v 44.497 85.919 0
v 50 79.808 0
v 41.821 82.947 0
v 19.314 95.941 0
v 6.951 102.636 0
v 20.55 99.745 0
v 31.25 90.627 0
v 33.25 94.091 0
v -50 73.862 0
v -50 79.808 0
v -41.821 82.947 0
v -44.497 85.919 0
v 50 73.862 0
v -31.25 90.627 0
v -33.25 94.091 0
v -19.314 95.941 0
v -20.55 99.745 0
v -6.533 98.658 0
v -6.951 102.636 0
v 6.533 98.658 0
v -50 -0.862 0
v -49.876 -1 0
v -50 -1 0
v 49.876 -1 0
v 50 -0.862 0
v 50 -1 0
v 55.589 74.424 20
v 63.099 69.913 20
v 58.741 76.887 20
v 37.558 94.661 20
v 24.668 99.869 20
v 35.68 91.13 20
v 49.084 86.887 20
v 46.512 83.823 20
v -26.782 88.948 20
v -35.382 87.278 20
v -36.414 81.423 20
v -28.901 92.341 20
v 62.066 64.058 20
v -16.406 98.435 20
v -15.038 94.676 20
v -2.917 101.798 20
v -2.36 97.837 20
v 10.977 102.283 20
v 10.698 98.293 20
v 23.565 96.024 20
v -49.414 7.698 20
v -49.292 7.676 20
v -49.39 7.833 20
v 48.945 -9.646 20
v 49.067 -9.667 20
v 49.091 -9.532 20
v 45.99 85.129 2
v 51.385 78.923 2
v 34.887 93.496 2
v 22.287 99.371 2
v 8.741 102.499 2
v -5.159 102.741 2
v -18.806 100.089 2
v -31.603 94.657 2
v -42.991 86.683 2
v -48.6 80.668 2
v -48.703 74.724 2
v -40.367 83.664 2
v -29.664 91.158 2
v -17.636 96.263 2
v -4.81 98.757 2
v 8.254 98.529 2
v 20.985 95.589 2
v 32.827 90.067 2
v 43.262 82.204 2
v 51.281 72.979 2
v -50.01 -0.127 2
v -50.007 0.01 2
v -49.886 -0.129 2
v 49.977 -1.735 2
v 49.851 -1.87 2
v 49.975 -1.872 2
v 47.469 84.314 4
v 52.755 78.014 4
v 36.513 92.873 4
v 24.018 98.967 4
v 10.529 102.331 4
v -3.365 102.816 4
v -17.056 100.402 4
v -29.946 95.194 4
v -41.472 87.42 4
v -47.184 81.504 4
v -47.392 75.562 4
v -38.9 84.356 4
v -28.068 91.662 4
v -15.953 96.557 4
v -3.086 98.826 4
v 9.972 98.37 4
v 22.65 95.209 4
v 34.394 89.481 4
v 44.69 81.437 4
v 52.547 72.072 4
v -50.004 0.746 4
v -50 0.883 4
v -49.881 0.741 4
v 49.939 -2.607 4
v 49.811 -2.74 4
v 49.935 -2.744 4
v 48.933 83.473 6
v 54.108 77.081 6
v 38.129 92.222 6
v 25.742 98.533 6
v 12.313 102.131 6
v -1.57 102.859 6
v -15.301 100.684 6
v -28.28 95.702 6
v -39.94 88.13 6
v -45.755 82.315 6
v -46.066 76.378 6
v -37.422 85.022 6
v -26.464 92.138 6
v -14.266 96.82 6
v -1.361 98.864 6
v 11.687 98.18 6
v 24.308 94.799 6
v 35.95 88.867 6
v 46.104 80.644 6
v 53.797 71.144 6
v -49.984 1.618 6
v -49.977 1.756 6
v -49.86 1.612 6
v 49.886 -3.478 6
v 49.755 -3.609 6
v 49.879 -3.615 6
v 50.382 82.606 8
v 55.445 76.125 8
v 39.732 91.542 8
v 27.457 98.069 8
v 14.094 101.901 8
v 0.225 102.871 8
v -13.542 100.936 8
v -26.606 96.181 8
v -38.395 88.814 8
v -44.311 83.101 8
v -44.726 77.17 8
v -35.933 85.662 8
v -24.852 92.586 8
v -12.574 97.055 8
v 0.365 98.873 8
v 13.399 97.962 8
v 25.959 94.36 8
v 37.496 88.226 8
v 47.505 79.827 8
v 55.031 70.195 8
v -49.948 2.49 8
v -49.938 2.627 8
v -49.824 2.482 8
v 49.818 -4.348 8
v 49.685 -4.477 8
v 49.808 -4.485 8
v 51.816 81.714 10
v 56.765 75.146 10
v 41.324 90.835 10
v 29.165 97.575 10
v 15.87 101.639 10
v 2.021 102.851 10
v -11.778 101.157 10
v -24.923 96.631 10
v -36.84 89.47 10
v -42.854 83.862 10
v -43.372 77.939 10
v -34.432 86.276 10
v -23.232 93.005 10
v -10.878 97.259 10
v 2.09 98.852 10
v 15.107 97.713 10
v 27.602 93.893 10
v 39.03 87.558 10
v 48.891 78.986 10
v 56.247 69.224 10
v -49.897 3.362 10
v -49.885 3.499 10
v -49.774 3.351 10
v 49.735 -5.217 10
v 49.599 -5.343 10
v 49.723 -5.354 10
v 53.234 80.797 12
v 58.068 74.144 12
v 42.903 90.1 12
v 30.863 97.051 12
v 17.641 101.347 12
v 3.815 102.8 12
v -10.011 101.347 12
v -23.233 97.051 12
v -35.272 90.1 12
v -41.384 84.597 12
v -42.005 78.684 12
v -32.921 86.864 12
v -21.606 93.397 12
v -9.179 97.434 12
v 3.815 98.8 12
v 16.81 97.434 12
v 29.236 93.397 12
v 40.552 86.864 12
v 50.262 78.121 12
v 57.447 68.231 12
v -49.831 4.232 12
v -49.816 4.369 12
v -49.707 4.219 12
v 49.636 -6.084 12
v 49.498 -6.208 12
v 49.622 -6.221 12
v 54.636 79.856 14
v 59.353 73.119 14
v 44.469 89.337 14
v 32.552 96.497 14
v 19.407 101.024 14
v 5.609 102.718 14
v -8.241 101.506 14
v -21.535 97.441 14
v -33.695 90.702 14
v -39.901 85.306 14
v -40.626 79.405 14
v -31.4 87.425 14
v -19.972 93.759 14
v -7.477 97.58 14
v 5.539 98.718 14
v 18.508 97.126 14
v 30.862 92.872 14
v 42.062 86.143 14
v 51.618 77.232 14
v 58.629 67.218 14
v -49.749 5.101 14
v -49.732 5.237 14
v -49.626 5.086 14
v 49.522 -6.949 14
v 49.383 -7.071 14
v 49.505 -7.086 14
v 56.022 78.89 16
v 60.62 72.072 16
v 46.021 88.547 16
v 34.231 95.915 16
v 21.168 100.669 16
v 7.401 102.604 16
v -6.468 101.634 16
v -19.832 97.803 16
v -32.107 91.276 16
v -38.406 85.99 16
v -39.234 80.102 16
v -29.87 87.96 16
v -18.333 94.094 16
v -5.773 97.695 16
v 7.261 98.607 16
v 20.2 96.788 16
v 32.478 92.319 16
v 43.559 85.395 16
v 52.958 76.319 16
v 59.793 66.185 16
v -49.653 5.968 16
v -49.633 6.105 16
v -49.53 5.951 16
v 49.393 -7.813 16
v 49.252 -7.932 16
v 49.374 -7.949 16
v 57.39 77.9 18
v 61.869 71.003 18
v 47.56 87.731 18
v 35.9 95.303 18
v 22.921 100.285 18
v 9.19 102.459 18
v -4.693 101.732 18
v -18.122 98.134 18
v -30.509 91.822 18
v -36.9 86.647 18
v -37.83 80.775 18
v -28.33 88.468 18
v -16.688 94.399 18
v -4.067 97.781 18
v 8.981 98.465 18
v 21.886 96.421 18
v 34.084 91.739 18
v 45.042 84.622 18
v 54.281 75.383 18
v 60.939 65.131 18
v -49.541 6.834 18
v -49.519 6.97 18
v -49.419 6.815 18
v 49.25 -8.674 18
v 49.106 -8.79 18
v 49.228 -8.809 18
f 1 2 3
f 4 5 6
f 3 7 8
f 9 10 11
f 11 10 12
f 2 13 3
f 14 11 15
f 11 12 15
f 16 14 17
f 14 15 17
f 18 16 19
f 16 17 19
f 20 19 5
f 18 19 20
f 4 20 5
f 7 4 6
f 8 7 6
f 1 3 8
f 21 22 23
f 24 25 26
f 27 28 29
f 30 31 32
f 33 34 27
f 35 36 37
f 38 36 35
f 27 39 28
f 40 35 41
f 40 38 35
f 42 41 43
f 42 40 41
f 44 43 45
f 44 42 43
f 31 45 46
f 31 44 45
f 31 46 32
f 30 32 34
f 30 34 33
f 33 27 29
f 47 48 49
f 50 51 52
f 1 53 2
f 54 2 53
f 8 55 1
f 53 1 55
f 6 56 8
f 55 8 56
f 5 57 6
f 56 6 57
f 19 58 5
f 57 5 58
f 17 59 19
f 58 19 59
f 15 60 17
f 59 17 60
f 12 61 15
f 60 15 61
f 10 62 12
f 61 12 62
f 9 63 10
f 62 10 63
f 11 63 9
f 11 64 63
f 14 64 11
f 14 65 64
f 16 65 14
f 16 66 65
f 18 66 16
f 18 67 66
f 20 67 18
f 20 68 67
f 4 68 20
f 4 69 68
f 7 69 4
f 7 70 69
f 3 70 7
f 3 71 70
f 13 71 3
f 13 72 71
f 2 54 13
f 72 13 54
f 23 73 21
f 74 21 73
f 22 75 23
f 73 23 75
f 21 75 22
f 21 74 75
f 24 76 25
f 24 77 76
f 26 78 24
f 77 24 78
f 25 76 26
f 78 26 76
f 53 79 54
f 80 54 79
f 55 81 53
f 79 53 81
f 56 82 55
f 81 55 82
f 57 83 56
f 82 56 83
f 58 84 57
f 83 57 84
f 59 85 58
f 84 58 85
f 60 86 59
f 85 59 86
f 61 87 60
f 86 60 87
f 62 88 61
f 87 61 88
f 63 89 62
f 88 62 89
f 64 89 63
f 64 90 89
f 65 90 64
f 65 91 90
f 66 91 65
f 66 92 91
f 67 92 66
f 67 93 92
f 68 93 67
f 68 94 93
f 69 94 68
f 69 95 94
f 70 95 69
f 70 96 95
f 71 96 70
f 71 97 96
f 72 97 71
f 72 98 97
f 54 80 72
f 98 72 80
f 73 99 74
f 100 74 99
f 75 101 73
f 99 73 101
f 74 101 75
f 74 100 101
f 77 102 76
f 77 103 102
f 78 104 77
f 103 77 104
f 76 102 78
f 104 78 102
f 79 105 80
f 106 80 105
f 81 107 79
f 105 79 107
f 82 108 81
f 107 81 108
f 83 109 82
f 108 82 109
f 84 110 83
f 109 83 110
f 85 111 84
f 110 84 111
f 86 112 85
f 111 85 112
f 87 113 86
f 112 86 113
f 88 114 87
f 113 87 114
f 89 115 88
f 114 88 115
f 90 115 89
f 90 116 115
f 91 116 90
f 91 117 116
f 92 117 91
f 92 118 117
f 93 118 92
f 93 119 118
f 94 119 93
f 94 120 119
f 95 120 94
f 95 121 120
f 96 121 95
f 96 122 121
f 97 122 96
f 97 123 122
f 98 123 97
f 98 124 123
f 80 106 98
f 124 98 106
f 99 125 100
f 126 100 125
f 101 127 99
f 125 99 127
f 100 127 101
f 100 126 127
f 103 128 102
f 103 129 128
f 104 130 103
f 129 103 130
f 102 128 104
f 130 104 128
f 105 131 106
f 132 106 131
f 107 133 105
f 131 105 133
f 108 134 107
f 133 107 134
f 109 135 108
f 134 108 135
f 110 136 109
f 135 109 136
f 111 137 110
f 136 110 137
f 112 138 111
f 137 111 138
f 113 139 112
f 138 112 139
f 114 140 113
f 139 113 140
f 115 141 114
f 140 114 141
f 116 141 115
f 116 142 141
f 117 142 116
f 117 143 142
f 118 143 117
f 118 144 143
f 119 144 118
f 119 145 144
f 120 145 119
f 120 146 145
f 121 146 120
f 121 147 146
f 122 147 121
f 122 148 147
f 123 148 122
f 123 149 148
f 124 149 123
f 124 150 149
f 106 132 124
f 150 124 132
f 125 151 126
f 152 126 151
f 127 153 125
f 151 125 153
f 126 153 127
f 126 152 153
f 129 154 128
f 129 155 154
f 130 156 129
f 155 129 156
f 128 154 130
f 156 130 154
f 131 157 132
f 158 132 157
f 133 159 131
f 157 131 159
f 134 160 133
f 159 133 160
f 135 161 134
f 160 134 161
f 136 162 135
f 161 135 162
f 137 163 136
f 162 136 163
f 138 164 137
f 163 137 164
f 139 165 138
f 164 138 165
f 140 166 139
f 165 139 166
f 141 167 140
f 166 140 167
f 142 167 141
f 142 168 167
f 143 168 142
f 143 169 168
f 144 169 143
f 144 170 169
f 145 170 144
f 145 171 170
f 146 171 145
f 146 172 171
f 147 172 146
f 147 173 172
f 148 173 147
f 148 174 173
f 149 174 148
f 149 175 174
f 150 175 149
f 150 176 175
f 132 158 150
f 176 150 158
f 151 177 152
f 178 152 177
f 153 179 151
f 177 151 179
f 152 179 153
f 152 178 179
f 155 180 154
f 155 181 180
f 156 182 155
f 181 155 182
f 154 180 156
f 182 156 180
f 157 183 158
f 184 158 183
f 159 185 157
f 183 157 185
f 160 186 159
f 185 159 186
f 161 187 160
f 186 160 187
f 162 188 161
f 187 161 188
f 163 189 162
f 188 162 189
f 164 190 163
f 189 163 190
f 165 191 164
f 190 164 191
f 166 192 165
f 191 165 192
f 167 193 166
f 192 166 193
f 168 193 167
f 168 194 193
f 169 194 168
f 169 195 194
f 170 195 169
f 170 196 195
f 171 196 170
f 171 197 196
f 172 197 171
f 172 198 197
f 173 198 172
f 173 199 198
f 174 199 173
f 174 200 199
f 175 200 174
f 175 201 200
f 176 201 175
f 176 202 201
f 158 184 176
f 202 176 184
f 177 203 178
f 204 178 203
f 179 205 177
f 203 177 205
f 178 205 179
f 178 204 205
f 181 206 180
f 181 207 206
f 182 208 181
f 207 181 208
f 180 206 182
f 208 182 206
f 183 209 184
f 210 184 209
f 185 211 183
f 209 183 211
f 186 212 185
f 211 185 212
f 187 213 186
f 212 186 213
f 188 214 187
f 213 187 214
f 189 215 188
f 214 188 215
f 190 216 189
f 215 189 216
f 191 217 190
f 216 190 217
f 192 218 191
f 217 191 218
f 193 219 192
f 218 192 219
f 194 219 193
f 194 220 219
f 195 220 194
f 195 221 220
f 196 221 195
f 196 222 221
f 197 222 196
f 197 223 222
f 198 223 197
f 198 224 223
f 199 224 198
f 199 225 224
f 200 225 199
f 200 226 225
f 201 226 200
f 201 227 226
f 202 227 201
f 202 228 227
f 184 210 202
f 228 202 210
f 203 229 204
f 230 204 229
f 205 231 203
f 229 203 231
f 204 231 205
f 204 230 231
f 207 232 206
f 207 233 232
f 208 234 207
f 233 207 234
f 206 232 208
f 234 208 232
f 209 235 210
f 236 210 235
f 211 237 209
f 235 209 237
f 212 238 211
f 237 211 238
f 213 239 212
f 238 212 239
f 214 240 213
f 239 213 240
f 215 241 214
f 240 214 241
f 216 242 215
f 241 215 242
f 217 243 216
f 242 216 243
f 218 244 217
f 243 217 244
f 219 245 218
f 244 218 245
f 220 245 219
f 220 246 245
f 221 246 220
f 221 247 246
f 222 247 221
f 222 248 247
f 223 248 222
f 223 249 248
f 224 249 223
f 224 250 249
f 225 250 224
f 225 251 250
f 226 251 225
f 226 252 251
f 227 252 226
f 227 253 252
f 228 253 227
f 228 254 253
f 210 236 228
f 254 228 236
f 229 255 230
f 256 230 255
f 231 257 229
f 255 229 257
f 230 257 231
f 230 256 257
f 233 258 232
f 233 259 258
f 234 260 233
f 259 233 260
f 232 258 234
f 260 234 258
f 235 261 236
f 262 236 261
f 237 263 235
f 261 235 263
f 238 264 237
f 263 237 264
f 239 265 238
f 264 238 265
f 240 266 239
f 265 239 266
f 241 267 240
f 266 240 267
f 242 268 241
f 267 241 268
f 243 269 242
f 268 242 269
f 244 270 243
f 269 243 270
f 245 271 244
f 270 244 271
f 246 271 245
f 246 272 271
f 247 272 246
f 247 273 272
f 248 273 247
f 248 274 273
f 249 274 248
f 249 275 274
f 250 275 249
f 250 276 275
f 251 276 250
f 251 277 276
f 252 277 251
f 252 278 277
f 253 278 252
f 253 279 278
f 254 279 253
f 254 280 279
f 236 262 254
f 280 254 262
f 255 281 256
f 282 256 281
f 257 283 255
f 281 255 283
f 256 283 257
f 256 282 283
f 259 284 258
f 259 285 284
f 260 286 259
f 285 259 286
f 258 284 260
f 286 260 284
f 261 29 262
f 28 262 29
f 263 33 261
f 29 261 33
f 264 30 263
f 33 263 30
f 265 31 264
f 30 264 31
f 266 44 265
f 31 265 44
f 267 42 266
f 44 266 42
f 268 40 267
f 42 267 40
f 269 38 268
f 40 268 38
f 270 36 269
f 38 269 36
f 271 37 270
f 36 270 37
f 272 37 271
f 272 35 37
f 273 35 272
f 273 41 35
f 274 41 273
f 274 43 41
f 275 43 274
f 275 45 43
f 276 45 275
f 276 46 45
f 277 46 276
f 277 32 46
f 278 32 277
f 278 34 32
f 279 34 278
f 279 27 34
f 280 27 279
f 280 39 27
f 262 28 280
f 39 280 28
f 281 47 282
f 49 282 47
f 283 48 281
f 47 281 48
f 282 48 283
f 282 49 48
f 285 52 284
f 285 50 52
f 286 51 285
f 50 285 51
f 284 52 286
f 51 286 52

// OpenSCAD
module testing1p1(length, width, height)
{
    radius = (pow(length,2) + 4*pow(height,2))/(8*height);
    translate([0,-radius+height,0])
    difference()
    {
        color("grey")circle(r=radius+width);
        color("orange")circle(r=(radius));
    }
}

//

module testing1p2(length, width, height)
{
    radius = (pow(length,2) + 4*pow(height,2))/(8*height);
    translate([-(radius+width),-(radius+width)*2,0,])
    color("green")square([(radius+width)*2,(radius+width)*2]);
}
//

module testing2(length, width, height)
{

    union() 
    {
        translate([-length,-height]) 
        square([length/2,height*2]);
        translate([length/2,-height])     
        square([length/2,height*2]);
    }
}
//

module myarc(length, width, height)
{
    //r = (l^2 + 4*b^2)/8*b 
    radius = (pow(length,2) + 4*pow(height,2))/(8*height);
    //echo(radius);
    translate([length/2,0,0])
    difference() 
    {
        difference() 
        {
            translate([0,-radius+height,0])
            difference() 
            {
                circle(r=radius+width);
                circle(r=(radius));
            }

            
            translate([-(radius+width),-(radius+width)*2,0,])
            square([(radius+width)*2,(radius+width)*2]);
        }
        union() 
        {
            translate([-length,-height]) 
            square([length/2,height*2]);
            translate([length/2,-height])     
            square([length/2,height*2]);
        }
    }
}
//

module compositing(length = 100, width = 4, height = 100)
{
    //myarc(100, 4, 100);//simulates this
    difference()
    {
        testing1p1(100, 4, 100);
        testing1p2(100, 4, 100);
        testing2(100, 4, 100);
    }    
}
//


union()
{        
    linear_extrude(height=20, centre=false, convexity=10, twist=10, slices=10)
    {
        translate([0, -1])
        {
            compositing();
        }
    }
}
